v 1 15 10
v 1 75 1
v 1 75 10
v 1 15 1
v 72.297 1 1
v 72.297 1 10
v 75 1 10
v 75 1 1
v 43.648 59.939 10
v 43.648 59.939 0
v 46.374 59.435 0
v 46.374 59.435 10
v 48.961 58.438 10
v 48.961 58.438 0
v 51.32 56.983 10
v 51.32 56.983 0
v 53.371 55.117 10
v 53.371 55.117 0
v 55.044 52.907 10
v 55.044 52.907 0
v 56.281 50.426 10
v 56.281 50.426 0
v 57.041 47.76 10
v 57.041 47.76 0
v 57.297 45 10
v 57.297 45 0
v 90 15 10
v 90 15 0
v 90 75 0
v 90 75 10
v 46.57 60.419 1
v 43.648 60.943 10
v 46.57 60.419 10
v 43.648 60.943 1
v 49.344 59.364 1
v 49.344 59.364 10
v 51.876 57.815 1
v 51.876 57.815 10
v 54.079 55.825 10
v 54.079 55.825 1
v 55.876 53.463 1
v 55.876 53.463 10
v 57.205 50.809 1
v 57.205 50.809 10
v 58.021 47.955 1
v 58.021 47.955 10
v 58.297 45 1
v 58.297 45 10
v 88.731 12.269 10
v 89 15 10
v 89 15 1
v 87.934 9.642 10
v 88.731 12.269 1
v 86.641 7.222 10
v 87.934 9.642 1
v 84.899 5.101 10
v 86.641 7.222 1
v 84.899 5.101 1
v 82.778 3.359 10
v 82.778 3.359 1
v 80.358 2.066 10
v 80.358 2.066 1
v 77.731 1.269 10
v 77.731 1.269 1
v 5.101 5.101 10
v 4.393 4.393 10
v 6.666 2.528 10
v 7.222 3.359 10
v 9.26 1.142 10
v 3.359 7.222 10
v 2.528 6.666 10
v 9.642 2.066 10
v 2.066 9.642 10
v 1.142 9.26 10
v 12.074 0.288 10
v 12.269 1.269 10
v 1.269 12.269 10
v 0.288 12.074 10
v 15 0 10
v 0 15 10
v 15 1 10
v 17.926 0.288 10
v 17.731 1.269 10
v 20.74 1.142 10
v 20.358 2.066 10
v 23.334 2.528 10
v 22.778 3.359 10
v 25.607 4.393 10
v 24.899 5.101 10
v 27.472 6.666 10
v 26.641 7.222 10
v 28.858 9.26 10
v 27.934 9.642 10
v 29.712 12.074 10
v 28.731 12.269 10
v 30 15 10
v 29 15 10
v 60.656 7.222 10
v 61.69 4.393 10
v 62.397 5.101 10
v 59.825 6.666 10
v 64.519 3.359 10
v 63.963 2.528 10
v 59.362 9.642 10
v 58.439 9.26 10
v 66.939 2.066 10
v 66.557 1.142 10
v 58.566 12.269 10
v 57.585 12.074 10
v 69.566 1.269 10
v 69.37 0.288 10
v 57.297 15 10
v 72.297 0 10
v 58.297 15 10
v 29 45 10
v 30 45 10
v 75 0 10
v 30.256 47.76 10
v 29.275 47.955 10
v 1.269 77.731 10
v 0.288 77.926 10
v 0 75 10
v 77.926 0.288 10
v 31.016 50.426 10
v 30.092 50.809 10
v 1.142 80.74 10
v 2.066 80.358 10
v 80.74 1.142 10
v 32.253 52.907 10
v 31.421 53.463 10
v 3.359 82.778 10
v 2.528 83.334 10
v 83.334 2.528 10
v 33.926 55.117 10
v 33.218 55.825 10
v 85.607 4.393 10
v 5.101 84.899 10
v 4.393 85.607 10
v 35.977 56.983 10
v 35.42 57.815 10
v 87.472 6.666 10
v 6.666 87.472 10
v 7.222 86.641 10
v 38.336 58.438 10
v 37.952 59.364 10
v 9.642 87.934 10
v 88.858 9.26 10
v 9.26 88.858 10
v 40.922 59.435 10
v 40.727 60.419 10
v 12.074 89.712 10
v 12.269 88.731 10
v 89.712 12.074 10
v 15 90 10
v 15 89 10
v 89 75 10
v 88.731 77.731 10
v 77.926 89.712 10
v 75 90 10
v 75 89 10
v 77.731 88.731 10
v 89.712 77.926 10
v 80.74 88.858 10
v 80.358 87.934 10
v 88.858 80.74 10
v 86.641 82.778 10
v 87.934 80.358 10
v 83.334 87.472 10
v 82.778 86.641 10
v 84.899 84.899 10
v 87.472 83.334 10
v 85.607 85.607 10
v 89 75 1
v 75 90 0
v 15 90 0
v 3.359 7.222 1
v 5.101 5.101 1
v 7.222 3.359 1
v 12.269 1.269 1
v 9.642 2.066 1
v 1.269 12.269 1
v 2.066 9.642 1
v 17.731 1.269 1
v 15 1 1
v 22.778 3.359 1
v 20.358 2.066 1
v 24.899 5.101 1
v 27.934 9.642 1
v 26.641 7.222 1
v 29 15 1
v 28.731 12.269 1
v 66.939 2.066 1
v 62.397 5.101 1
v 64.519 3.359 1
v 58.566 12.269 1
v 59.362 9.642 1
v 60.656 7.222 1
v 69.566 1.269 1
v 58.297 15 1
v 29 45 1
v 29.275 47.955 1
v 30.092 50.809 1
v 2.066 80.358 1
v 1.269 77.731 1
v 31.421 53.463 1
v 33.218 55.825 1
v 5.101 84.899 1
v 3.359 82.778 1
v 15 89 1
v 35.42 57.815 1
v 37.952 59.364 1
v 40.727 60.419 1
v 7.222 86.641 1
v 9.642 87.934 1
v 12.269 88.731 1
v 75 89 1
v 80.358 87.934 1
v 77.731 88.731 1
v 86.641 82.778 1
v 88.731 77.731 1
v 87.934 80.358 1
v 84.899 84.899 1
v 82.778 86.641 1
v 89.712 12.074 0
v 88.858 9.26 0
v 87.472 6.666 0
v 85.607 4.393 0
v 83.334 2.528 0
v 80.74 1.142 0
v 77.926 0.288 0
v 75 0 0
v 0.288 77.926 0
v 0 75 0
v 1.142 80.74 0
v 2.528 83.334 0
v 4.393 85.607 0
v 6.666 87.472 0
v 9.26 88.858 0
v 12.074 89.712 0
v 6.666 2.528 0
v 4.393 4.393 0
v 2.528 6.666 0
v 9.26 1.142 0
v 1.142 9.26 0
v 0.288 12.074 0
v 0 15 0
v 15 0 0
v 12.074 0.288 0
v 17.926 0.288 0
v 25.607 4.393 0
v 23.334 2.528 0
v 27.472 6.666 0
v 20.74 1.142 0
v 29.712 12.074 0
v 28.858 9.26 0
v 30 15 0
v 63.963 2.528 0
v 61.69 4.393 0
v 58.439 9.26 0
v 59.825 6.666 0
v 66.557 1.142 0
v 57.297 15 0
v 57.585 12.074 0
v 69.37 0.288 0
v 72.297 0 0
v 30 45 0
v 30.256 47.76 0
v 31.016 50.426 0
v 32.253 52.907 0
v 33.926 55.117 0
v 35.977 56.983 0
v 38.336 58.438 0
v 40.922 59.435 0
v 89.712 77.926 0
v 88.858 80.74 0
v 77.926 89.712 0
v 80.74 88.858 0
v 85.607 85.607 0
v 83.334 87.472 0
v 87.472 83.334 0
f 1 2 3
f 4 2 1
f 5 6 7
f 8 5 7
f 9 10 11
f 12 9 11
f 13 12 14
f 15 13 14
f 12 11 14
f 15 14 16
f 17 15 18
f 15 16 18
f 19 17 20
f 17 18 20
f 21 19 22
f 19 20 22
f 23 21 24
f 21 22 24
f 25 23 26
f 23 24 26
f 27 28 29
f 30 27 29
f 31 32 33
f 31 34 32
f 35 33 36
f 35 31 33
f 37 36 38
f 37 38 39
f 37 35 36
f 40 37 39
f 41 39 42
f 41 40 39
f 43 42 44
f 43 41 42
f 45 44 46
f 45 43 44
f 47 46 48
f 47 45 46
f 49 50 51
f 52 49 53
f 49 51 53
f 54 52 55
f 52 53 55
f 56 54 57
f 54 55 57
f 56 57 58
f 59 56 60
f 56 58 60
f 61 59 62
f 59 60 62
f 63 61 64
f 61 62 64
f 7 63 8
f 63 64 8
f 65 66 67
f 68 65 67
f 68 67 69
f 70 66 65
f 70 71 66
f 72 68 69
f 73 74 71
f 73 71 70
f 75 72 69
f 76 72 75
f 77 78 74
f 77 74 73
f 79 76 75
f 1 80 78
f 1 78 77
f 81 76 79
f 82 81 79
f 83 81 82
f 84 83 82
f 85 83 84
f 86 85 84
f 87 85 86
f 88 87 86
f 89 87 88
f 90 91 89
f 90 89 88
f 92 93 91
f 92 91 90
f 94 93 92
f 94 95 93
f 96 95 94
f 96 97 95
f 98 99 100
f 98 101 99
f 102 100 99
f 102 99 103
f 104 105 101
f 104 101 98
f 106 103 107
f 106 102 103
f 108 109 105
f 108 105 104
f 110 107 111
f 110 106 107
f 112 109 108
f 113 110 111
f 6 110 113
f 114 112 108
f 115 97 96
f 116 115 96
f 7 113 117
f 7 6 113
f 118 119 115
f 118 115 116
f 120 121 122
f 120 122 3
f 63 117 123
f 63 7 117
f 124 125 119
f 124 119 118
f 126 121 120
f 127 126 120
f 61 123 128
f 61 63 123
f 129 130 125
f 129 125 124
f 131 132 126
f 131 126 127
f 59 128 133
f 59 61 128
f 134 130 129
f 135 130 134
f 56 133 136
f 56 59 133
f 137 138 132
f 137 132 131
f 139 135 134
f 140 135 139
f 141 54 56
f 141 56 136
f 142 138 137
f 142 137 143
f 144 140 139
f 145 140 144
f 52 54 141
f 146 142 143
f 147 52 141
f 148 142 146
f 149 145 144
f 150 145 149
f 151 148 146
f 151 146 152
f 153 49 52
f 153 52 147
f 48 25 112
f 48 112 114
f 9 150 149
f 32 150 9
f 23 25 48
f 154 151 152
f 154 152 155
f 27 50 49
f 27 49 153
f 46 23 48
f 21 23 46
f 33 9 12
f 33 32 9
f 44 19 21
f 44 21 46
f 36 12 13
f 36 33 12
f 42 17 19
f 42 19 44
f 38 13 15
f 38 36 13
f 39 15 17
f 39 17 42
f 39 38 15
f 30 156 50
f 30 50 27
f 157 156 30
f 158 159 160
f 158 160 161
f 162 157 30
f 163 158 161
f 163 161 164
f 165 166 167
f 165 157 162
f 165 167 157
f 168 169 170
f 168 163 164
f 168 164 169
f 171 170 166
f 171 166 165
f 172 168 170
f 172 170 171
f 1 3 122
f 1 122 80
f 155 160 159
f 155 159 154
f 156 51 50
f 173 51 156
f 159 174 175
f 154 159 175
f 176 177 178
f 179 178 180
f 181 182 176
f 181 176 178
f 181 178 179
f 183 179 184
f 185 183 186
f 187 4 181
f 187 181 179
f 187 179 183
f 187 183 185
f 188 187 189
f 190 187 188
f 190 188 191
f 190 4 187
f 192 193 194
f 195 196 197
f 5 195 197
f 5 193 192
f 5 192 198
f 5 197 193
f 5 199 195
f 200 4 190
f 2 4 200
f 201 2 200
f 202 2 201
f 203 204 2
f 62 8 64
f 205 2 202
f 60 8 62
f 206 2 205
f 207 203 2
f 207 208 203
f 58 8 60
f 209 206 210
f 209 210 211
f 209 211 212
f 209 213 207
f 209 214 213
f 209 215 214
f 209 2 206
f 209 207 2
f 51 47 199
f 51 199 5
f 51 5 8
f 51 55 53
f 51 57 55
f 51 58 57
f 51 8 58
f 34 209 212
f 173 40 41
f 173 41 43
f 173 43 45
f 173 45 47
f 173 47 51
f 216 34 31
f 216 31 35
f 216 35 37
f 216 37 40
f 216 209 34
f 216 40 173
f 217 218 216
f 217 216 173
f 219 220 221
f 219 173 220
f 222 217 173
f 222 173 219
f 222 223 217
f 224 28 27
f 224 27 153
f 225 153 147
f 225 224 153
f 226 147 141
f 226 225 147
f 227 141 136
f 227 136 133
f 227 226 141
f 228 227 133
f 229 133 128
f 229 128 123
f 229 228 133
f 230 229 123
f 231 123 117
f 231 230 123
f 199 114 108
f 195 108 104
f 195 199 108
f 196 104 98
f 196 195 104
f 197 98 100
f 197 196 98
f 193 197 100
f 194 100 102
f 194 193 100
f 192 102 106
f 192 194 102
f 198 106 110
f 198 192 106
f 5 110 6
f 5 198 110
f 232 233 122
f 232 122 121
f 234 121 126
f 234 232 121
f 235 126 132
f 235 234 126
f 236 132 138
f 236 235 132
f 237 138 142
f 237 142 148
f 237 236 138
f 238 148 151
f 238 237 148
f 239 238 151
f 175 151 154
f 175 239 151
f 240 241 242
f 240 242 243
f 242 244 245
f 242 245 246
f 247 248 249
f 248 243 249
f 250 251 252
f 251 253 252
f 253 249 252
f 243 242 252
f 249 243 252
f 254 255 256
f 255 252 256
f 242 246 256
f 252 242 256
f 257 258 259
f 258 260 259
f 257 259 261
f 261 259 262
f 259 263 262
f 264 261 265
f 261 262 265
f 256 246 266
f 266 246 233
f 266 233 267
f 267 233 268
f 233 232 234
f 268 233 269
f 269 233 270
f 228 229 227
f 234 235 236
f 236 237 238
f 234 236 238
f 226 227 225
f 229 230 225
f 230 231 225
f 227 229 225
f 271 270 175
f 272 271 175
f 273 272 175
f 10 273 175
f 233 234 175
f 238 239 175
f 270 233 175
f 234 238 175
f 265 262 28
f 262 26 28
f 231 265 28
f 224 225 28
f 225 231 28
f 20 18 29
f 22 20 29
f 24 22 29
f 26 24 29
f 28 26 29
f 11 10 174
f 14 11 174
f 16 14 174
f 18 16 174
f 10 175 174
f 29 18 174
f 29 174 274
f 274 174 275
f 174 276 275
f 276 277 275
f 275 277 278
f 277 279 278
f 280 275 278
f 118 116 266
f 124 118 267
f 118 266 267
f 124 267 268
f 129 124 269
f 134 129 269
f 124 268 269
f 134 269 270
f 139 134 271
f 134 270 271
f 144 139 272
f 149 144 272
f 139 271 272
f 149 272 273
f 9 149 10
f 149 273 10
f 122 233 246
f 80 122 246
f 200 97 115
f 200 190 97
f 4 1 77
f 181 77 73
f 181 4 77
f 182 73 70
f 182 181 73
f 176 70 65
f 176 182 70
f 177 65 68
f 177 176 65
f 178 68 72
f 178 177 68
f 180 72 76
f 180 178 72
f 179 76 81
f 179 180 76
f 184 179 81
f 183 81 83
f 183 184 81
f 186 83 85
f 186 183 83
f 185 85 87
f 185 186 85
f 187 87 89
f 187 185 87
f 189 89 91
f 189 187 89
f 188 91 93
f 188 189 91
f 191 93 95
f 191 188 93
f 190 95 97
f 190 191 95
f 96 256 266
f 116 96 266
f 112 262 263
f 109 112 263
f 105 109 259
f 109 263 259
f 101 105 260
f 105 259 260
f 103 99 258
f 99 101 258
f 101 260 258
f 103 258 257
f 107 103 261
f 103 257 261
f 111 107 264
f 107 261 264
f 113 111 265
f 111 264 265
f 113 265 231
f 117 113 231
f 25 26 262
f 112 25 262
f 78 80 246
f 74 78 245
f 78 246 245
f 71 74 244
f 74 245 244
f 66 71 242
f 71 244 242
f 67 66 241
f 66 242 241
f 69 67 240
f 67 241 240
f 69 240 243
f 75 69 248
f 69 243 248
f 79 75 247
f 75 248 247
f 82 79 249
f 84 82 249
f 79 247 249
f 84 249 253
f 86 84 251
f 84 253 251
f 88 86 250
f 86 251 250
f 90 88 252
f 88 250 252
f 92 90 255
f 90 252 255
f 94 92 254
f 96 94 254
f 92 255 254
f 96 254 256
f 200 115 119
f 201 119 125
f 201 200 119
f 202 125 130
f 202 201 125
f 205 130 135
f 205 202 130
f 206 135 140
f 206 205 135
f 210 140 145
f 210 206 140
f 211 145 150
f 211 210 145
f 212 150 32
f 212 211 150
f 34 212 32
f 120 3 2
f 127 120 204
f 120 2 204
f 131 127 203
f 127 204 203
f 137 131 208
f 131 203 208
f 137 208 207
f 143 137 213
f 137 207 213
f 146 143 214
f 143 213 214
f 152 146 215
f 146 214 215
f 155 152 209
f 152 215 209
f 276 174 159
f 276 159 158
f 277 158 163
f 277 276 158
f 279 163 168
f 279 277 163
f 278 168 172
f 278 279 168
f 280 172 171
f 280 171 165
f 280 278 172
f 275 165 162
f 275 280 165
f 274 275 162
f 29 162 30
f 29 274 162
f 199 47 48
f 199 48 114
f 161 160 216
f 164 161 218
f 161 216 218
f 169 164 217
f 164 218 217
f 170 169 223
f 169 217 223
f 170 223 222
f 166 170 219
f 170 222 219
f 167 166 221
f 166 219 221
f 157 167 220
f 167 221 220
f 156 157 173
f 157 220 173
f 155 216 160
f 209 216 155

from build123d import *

# Parameters (mm, degrees)
F1_DEPTH    = 10
F2_T1_DEPTH = 10
F2_T3_DEPTH = 85
F3_T        = -1


# Not quite as in the source:
# - a fillet or chamfer that OpenCascade refuses, or shapes differently, is made with other operations: its cross-section is extruded or revolved along the edge and cut away or added


with BuildPart() as f1:
    # F0 (on Top) → F1 (new body)
    with BuildSketch(Plane.XY):
        Polygon((0, 90), (0, 0), (30, 0), (30, 60), (57.2968044168, 60), (57.2968044168, 0), (90, 0), (90, 90), align=None)
    extrude(amount=F1_DEPTH)

    # F2: fillet of radius 15 on 8 edges, made by hand

    # F2_s2 → F2_t1 (join)
    with BuildSketch(Plane.XY):
        with BuildLine():
            ThreePointArc((42.2968044168, 60), (52.9034061346, 55.6066017178), (57.2968044168, 45))
            Line((57.2968044168, 45), (57.2968044168, 60))
            Line((57.2968044168, 60), (42.2968044168, 60))
        make_face()
        with BuildLine():
            ThreePointArc((30, 45), (34.3933982822, 55.6066017178), (45, 60))
            Line((45, 60), (30, 60))
            Line((30, 60), (30, 45))
        make_face()
    extrude(amount=F2_T1_DEPTH)

    # F2_s4 → F2_t3 (cut)
    with BuildSketch(Plane.XY.offset(-37.5)):
        with BuildLine():
            ThreePointArc((75, 90), (85.6066017178, 85.6066017178), (90, 75))
            Line((90, 75), (90, 90))
            Line((90, 90), (75, 90))
        make_face()
        with BuildLine():
            ThreePointArc((90, 15), (85.6066017178, 4.3933982822), (75, 0))
            Line((75, 0), (90, 0))
            Line((90, 0), (90, 15))
        make_face()
        with BuildLine():
            ThreePointArc((15, 0), (25.6066017178, 4.3933982822), (30, 15))
            Line((30, 15), (30, 0))
            Line((30, 0), (15, 0))
        make_face()
        with BuildLine():
            ThreePointArc((57.2968044168, 15), (61.690202699, 4.3933982822), (72.2968044168, 0))
            Line((72.2968044168, 0), (57.2968044168, 0))
            Line((57.2968044168, 0), (57.2968044168, 15))
        make_face()
        with BuildLine():
            ThreePointArc((0, 15), (4.3933982822, 4.3933982822), (15, 0))
            Line((15, 0), (0, 0))
            Line((0, 0), (0, 15))
        make_face()
        with BuildLine():
            ThreePointArc((0, 75), (4.3933982822, 85.6066017178), (15, 90))
            Line((15, 90), (0, 90))
            Line((0, 90), (0, 75))
        make_face()
    extrude(amount=F2_T3_DEPTH, mode=Mode.SUBTRACT)

    # F3
    f3_openings = [f1.faces().sort_by_distance(p)[0] for p in [
        (5.293398, 84.706602, 10),
    ]]
    offset(amount=F3_T, openings=f3_openings, kind=Kind.INTERSECTION)


solid = f1.part
